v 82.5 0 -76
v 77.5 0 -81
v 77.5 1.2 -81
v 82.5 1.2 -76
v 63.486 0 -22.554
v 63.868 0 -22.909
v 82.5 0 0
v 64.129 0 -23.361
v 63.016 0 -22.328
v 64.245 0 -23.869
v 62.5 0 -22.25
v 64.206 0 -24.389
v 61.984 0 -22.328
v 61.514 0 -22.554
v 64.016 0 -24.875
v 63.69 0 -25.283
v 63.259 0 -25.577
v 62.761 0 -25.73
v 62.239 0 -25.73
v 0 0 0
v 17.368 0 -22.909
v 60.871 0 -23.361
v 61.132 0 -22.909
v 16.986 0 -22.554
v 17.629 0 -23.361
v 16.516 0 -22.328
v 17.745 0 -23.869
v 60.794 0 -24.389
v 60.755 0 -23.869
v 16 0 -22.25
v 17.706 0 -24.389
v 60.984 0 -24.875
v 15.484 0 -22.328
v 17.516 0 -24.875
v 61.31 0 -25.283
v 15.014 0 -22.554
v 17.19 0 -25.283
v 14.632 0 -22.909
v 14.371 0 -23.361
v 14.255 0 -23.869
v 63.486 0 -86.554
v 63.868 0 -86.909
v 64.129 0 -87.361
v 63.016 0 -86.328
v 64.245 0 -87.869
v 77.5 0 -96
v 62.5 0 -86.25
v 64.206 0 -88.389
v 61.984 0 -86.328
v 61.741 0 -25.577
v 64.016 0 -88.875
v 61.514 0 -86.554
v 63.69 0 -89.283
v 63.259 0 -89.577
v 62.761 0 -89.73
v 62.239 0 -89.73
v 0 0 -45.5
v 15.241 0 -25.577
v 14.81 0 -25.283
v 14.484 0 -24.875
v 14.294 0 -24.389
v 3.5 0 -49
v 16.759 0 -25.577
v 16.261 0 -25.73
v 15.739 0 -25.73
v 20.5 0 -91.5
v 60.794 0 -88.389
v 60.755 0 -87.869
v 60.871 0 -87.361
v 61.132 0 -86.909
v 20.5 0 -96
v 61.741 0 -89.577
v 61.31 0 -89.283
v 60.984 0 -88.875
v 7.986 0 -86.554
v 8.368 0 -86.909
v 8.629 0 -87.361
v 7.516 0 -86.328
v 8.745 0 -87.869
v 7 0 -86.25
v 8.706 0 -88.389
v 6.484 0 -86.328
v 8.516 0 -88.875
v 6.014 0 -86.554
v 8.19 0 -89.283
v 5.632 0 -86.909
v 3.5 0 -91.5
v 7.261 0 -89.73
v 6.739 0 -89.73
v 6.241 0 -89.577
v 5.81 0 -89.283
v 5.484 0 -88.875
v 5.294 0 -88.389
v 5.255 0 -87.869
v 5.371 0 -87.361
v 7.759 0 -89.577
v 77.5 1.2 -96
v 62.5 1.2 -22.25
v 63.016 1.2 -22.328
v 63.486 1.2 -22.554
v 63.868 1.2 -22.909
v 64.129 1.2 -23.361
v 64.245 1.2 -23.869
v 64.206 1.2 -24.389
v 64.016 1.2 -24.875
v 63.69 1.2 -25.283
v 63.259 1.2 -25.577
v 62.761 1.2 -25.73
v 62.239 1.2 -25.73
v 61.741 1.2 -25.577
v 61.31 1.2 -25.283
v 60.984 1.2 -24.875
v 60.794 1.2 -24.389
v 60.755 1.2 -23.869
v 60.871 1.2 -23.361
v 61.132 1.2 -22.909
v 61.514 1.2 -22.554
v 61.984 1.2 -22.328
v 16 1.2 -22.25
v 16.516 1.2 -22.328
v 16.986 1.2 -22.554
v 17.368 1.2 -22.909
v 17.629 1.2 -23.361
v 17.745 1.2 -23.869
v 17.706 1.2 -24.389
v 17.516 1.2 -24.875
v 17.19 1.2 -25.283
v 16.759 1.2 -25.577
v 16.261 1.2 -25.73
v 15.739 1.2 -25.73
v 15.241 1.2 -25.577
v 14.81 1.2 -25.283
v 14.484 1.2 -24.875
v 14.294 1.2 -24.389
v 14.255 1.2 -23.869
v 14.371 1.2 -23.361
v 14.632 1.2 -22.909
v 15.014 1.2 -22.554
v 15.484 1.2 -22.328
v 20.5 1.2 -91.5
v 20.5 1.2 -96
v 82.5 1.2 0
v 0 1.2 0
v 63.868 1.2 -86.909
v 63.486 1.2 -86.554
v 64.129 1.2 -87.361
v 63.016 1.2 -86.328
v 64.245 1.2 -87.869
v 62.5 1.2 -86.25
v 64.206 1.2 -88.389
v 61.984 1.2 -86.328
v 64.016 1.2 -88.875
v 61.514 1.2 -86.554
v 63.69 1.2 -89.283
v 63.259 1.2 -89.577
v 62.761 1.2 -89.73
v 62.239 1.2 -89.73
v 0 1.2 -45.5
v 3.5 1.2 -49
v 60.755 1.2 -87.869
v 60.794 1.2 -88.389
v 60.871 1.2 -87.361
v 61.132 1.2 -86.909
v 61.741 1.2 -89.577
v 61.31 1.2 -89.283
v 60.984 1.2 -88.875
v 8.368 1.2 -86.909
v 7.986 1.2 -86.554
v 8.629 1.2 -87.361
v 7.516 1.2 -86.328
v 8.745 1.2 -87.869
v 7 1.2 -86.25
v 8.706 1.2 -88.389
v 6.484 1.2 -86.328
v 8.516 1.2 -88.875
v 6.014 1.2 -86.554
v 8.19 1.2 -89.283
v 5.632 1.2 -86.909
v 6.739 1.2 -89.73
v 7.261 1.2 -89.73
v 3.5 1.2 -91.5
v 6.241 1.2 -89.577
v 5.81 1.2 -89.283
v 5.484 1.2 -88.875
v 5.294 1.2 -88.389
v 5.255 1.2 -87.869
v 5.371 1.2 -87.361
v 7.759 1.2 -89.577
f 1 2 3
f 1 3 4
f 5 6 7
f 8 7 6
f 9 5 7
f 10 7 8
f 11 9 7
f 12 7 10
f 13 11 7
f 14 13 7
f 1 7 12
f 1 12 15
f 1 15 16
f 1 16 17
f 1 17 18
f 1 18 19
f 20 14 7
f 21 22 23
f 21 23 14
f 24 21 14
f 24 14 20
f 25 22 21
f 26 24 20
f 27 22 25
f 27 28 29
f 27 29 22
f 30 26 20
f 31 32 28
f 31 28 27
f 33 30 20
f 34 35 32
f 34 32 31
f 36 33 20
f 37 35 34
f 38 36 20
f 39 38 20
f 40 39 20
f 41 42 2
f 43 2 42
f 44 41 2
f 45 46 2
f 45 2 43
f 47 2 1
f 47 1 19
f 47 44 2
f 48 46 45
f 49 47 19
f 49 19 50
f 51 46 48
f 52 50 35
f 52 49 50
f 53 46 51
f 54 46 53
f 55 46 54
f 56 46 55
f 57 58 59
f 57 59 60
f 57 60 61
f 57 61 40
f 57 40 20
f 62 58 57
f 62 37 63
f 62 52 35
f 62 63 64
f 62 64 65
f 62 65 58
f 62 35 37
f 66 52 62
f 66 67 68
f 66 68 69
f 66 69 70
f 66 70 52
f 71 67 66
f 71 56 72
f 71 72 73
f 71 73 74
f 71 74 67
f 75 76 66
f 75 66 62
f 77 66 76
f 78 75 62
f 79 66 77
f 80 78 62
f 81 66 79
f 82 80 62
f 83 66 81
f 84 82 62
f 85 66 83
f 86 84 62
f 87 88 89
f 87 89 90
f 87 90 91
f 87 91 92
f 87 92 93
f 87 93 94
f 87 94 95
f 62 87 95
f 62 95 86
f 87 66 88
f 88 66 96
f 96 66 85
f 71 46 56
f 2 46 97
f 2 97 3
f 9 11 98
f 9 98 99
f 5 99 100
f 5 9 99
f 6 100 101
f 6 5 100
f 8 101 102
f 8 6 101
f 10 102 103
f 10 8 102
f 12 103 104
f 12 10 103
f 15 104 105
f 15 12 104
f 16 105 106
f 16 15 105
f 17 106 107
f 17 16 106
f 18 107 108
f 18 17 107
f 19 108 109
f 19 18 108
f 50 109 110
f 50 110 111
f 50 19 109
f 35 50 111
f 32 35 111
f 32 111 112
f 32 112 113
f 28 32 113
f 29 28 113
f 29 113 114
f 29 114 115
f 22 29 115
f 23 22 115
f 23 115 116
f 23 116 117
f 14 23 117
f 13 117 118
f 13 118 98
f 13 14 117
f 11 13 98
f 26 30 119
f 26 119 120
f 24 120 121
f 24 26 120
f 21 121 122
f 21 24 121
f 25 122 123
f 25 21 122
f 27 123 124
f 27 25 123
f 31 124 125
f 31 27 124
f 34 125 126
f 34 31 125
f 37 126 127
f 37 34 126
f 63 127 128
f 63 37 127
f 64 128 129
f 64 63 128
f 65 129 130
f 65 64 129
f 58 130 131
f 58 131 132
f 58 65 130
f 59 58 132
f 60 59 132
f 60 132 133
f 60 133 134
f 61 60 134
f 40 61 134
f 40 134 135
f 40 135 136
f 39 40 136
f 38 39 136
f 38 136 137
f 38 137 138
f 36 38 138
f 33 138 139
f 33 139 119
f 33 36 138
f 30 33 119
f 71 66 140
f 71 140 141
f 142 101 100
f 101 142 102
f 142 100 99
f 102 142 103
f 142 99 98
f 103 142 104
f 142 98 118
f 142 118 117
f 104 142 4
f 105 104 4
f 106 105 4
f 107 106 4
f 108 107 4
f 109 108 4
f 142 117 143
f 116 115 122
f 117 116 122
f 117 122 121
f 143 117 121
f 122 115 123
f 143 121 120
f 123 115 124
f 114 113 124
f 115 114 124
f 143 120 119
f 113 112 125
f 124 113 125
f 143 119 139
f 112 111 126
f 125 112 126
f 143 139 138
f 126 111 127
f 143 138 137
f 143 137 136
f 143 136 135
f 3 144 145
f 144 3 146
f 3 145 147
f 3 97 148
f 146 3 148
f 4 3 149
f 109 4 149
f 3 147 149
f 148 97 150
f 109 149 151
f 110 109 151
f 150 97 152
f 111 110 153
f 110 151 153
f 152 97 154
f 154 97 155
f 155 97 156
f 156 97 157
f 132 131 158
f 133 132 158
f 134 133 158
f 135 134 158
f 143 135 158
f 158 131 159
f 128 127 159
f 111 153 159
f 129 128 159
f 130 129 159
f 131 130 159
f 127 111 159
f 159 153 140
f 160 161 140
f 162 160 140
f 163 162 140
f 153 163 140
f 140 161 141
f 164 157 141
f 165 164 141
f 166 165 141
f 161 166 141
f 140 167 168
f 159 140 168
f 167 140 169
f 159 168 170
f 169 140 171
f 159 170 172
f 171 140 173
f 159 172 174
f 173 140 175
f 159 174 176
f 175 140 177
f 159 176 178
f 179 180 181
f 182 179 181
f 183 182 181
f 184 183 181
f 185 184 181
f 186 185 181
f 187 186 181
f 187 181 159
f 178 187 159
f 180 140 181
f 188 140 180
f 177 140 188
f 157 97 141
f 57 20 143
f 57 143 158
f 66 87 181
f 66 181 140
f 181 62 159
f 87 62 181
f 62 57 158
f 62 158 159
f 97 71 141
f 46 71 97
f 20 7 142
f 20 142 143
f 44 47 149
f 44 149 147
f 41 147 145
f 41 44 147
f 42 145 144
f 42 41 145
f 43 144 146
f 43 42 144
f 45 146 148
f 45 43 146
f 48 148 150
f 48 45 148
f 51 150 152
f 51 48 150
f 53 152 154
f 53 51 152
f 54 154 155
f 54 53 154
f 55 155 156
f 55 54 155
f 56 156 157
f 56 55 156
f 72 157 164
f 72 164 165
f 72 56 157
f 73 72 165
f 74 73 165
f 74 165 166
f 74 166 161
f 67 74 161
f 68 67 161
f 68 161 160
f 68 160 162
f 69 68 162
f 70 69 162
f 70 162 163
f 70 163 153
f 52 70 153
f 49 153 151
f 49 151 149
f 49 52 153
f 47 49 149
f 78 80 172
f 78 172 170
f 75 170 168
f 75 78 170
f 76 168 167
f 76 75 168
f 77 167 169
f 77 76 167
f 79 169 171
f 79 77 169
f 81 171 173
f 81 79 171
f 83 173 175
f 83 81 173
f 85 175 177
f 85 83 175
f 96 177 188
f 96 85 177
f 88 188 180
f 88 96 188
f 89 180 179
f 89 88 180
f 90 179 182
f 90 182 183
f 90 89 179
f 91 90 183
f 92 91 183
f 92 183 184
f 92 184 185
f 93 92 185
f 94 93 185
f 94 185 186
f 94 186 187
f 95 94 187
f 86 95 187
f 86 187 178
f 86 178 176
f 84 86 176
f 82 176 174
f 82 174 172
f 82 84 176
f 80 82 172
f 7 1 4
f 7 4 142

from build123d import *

# Parameters (mm, degrees)
SKETCH1_R = 1.75
PCB_DEPTH = 1.2


with BuildPart() as part:
    # Sketch1 → PCB (new body)
    with BuildSketch(Plane(origin=(0, 0, 0), x_dir=(1, 0, 0), z_dir=(0, 1, 0))):
        Polygon((0, 0), (0, 45.5), (3.5, 49), (3.5, 91.5), (20.5, 91.5), (20.5, 96), (77.5, 96), (77.5, 81), (82.5, 76), (82.5, 0), align=None)
        with Locations(Location((7, 88, 0), (0, 0, 270))):
            Circle(SKETCH1_R, mode=Mode.SUBTRACT)
        with Locations(Location((62.5, 88, 0), (0, 0, 270))):
            Circle(SKETCH1_R, mode=Mode.SUBTRACT)
        with Locations(Location((62.5, 24, 0), (0, 0, 270))):
            Circle(SKETCH1_R, mode=Mode.SUBTRACT)
        with Locations(Location((16, 24, 0), (0, 0, 270))):
            Circle(SKETCH1_R, mode=Mode.SUBTRACT)
    extrude(amount=PCB_DEPTH)


solid = part.part
